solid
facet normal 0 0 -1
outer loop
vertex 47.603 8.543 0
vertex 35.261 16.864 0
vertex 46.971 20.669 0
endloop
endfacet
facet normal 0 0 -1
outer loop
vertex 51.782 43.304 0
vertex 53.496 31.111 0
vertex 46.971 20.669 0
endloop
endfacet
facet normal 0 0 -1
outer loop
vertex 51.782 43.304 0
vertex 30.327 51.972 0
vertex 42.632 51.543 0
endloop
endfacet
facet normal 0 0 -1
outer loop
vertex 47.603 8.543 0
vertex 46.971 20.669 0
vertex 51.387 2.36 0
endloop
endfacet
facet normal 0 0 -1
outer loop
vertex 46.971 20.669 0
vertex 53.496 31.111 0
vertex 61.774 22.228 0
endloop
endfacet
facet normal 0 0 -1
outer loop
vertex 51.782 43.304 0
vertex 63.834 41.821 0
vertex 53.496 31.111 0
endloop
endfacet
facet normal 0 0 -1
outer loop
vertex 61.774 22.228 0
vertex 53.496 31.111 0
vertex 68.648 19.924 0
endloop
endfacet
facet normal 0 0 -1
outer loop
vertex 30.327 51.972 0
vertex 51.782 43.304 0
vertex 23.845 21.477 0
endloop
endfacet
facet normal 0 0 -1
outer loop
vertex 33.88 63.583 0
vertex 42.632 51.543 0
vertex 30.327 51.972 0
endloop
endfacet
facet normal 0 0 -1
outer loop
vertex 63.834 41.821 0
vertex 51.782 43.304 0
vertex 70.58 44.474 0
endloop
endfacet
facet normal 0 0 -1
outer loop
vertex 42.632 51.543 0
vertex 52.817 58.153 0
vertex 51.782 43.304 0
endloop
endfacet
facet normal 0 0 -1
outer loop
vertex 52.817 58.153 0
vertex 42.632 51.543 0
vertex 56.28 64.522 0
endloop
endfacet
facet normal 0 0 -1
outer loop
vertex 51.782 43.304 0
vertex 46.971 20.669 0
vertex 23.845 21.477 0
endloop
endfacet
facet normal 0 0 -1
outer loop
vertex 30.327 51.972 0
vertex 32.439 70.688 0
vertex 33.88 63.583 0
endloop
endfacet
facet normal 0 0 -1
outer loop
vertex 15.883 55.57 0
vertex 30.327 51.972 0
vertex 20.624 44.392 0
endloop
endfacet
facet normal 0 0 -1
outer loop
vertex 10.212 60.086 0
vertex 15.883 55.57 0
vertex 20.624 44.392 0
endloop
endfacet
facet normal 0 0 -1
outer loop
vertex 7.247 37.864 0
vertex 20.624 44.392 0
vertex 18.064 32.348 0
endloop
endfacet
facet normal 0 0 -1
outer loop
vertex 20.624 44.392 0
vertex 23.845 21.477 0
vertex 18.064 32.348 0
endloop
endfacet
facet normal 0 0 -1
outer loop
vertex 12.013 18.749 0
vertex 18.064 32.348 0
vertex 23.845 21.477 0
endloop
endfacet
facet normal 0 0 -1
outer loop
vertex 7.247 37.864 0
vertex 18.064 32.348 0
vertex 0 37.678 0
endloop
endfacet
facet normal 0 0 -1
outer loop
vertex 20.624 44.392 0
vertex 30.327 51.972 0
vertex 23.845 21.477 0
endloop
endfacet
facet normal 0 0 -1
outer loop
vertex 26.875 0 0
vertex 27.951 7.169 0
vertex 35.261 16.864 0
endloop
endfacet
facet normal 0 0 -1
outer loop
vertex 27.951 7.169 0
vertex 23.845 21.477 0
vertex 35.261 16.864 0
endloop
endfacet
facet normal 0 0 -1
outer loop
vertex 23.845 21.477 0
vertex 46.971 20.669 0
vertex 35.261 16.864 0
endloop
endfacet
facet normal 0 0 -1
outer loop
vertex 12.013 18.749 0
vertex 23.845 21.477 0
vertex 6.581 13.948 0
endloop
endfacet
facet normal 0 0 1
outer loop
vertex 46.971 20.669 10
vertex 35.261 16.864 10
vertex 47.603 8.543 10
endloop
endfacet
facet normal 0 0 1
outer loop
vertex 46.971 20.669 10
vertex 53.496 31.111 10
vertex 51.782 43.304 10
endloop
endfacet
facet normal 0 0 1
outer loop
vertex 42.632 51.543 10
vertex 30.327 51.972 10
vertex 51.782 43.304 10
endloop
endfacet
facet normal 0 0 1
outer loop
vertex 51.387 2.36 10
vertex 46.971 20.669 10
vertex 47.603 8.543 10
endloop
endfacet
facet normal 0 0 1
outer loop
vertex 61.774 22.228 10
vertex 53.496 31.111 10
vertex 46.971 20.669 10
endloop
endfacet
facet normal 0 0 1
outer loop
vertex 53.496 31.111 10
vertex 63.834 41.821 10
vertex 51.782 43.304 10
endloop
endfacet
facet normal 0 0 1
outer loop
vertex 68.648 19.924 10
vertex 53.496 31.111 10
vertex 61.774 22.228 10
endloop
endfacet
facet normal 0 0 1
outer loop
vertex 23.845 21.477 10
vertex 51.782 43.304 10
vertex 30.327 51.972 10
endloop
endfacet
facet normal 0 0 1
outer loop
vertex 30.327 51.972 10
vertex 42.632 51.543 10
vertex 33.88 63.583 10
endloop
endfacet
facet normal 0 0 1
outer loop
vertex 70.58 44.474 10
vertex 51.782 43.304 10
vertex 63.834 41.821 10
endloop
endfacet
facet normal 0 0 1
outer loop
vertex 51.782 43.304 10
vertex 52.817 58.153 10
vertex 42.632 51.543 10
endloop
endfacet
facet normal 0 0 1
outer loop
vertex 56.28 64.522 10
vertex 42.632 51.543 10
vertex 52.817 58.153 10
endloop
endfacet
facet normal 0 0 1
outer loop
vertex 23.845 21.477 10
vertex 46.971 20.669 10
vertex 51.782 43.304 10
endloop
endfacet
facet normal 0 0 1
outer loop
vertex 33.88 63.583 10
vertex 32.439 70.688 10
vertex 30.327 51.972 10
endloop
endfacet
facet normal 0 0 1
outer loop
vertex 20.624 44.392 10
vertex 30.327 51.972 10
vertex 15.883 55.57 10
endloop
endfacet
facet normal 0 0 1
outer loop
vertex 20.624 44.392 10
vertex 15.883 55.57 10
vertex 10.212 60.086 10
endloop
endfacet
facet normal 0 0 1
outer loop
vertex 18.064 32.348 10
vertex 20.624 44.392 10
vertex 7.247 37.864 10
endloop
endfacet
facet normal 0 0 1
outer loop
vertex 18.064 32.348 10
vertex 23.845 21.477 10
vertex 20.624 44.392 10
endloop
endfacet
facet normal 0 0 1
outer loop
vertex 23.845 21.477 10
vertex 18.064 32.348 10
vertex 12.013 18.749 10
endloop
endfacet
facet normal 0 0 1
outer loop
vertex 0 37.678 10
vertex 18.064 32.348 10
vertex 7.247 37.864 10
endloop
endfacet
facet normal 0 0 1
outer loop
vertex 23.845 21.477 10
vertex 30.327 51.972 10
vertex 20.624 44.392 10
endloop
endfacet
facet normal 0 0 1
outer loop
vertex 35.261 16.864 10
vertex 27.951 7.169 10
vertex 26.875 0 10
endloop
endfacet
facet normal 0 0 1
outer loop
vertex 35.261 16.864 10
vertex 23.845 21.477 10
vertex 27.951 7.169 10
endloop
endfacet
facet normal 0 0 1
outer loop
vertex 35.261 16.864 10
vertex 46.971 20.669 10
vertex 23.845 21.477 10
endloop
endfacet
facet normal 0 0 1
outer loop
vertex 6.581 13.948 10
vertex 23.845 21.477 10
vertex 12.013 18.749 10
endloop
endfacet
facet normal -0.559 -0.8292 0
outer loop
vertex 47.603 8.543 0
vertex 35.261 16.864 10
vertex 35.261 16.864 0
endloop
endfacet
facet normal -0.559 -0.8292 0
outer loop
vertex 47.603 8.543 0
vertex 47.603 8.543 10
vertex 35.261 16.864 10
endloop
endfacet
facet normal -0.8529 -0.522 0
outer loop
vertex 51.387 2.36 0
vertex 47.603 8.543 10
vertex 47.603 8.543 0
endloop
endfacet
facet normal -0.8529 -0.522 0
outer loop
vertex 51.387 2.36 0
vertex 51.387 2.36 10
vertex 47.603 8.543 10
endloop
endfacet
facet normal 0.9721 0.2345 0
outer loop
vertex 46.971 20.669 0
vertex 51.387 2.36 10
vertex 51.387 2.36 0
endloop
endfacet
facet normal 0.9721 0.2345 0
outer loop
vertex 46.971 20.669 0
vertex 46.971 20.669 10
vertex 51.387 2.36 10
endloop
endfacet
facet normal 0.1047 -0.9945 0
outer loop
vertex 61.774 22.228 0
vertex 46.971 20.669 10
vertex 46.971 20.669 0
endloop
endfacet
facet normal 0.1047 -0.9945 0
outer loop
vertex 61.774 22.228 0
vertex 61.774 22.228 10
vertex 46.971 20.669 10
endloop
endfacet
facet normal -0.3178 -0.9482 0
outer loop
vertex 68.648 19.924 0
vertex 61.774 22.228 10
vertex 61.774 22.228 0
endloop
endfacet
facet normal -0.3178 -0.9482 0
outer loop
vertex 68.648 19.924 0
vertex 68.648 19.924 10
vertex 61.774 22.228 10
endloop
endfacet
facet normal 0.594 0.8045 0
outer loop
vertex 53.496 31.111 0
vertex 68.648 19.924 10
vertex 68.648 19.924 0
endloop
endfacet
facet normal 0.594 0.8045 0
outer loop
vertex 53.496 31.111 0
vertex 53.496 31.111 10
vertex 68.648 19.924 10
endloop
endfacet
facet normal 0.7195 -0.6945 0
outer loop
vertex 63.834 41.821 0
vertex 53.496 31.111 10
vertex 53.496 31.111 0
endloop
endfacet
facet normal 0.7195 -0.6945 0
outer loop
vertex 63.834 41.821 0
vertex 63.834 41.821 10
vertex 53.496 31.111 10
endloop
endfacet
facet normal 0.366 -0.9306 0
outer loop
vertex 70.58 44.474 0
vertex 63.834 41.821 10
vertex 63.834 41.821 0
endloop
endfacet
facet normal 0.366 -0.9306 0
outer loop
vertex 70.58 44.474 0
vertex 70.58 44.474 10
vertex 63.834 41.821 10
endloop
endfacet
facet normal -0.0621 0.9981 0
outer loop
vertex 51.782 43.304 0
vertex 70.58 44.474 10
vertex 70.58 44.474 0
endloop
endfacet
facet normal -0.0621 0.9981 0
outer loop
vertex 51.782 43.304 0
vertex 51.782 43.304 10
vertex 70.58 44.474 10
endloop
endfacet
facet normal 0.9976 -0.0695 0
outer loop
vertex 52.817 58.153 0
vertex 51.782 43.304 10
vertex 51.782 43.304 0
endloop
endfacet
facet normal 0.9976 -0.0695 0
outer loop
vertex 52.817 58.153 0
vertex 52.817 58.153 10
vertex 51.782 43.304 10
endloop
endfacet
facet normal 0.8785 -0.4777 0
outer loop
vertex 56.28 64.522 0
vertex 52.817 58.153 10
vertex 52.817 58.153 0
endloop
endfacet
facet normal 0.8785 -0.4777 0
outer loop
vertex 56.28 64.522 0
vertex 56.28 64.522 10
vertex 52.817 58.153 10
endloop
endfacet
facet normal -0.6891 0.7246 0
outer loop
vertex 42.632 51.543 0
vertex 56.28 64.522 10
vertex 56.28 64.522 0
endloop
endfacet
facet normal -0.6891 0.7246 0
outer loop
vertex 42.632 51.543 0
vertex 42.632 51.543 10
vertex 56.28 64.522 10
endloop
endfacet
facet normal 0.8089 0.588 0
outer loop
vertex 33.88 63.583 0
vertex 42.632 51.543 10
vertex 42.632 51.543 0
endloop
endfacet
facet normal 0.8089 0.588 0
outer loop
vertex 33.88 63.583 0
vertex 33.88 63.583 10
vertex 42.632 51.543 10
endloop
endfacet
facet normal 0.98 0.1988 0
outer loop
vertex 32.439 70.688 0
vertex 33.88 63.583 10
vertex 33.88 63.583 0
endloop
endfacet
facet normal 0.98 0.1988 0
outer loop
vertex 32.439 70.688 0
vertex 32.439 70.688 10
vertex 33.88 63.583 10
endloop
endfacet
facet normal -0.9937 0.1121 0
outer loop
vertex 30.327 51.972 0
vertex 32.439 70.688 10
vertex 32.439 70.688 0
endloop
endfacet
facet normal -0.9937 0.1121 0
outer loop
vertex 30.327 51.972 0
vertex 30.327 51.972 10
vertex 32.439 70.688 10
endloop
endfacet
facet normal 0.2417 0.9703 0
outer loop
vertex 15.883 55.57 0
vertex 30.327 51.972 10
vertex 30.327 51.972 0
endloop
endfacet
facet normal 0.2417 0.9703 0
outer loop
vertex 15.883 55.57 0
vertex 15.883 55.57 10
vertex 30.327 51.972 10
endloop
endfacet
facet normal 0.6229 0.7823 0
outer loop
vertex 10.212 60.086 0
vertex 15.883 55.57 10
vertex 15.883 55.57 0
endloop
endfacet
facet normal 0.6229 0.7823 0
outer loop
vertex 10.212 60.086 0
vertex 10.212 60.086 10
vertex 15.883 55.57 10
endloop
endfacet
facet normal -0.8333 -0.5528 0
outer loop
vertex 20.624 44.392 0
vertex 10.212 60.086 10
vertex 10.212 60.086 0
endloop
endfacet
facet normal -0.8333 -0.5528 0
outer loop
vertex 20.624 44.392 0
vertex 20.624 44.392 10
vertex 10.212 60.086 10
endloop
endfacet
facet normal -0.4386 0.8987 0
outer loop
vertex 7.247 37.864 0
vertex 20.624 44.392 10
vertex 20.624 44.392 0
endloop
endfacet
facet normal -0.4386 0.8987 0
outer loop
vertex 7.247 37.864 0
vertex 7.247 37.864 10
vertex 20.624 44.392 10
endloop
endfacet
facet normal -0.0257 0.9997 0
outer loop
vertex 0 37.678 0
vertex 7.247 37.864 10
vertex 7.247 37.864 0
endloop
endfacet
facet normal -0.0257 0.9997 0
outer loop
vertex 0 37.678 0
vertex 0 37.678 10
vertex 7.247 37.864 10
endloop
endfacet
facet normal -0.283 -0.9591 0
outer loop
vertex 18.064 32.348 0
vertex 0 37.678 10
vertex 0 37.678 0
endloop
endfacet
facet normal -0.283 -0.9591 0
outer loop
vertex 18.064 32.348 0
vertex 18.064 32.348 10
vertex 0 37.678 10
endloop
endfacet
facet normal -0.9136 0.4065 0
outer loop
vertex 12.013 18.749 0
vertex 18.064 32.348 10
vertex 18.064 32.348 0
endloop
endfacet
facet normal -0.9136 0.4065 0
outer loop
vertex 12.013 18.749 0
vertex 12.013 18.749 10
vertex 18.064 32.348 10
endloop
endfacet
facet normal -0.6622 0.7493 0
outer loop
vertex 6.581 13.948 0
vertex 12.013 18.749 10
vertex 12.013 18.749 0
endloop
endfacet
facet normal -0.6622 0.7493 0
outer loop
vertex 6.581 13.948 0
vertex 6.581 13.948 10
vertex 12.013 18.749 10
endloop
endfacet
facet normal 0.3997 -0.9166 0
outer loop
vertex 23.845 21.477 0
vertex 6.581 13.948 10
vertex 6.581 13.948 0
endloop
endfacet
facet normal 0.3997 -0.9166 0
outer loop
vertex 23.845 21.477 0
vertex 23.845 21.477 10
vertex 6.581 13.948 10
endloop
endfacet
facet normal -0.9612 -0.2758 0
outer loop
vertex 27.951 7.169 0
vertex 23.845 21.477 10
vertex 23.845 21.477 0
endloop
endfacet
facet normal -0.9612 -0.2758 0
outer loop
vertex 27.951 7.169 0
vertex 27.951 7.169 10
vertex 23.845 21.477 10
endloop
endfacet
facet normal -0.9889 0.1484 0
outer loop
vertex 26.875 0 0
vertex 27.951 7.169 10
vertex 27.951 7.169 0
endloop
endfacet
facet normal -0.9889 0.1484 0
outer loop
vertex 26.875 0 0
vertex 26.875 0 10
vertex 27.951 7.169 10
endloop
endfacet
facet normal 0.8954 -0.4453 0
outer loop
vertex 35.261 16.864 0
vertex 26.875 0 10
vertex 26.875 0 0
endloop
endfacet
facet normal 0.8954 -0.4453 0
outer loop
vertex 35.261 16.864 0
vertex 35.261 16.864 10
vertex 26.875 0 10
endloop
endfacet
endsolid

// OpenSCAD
$fn = 32;

// ----------------------------------------------------------------------
// Fan rotor section: 9 blades, 18 mm hub radius, 18 mm blades
// ----------------------------------------------------------------------

// --- parameters (mm) ---
profile_height = 10;      // extrusion height
profile_points = 27;      // points of the closed outline

profile = [[53.496, 31.111], [63.834, 41.821], [70.58, 44.474], [51.782, 43.304], [52.817, 58.153], [56.28, 64.522], [42.632, 51.543], [33.88, 63.583], [32.439, 70.688], [30.327, 51.972], [15.883, 55.57], [10.212, 60.086], [20.624, 44.392], [7.247, 37.864], [0, 37.678], [18.064, 32.348], [12.013, 18.749], [6.581, 13.948], [23.845, 21.477], [27.951, 7.169], [26.875, 0], [35.261, 16.864], [47.603, 8.543], [51.387, 2.36], [46.971, 20.669], [61.774, 22.228], [68.648, 19.924]];  // single closed polygon, 27 points, counter clockwise

// --- the one profile operation ---
linear_extrude(height = profile_height) polygon(points = profile);
